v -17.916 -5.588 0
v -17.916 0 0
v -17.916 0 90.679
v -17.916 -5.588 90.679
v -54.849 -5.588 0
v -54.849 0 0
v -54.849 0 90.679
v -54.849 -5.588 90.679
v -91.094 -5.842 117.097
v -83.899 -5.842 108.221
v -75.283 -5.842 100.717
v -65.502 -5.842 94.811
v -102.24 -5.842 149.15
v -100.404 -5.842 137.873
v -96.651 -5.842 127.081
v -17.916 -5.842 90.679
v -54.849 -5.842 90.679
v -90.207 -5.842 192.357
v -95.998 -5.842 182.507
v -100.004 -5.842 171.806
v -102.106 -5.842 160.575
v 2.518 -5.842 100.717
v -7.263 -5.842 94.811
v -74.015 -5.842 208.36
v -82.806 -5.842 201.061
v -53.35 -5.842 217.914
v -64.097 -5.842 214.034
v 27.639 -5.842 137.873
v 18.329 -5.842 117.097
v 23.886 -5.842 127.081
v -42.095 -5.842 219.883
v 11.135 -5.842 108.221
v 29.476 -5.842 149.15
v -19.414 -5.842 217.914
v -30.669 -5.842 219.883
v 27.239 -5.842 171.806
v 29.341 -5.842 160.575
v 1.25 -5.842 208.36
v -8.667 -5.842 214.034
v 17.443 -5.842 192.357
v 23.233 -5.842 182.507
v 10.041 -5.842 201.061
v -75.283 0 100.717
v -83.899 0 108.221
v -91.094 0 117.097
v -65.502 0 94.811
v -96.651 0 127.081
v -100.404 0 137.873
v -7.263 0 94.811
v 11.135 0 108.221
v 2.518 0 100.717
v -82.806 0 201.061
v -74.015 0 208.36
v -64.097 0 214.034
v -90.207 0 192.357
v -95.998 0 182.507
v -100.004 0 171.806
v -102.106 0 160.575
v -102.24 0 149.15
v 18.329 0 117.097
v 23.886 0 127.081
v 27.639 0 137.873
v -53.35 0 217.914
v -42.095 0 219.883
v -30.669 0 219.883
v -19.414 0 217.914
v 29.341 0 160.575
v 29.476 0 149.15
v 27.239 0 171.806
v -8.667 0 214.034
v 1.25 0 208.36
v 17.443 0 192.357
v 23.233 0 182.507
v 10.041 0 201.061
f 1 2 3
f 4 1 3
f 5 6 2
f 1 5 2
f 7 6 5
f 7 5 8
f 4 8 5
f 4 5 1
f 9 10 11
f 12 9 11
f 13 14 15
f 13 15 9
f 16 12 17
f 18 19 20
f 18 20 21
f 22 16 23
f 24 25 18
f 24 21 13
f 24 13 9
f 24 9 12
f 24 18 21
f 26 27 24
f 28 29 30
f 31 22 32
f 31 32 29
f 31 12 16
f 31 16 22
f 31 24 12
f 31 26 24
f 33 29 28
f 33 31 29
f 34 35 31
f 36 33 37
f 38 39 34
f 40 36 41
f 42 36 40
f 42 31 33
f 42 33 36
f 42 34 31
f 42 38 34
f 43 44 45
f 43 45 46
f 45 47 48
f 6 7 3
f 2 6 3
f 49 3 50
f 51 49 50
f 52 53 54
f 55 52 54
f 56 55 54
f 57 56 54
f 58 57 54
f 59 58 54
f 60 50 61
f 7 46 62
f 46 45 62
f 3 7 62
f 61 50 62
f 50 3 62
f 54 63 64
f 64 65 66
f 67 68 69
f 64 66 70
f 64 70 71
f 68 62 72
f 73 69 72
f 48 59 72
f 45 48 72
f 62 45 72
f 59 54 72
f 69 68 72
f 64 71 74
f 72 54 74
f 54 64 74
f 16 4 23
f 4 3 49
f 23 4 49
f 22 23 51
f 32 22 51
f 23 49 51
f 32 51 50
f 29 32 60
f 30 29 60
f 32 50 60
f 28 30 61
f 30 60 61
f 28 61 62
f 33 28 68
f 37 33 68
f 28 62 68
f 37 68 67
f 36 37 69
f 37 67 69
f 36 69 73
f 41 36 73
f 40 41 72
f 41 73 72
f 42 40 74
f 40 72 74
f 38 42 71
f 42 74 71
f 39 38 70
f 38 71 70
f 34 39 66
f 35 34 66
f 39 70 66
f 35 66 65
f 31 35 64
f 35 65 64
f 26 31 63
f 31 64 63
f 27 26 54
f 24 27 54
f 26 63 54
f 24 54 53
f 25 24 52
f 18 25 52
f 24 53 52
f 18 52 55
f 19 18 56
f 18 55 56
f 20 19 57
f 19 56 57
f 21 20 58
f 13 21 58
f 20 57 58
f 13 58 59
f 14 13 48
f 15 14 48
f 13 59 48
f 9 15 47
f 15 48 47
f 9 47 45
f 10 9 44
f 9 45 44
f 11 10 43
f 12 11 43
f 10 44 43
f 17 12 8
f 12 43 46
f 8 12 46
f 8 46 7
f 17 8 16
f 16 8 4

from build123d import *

# Parameters (mm, degrees)
F1_DEPTH = 5.842
F0_W     = 36.9333177805
F0_H     = 90.6793028116
F2_DEPTH = 5.588


with BuildPart() as f1:
    # F0 (on Front) → F1 (new body)
    with BuildSketch(Plane.XZ):
        with BuildLine():
            Line((-54.8489093781, 90.6793028116), (-17.9155915976, 90.6793028116))
            ThreePointArc((-17.9155915976, 90.6793028116), (-36.3822504878, 220.1306557061), (-54.8489093781, 90.6793028116))
        make_face()
    extrude(amount=F1_DEPTH)

    # F0 (on Front) → F2 (join)
    with BuildSketch(Plane.XZ):
        with Locations((-36.3822504878, 45.3396514058)):
            Rectangle(F0_W, F0_H)
    extrude(amount=F2_DEPTH)


solid = f1.part
